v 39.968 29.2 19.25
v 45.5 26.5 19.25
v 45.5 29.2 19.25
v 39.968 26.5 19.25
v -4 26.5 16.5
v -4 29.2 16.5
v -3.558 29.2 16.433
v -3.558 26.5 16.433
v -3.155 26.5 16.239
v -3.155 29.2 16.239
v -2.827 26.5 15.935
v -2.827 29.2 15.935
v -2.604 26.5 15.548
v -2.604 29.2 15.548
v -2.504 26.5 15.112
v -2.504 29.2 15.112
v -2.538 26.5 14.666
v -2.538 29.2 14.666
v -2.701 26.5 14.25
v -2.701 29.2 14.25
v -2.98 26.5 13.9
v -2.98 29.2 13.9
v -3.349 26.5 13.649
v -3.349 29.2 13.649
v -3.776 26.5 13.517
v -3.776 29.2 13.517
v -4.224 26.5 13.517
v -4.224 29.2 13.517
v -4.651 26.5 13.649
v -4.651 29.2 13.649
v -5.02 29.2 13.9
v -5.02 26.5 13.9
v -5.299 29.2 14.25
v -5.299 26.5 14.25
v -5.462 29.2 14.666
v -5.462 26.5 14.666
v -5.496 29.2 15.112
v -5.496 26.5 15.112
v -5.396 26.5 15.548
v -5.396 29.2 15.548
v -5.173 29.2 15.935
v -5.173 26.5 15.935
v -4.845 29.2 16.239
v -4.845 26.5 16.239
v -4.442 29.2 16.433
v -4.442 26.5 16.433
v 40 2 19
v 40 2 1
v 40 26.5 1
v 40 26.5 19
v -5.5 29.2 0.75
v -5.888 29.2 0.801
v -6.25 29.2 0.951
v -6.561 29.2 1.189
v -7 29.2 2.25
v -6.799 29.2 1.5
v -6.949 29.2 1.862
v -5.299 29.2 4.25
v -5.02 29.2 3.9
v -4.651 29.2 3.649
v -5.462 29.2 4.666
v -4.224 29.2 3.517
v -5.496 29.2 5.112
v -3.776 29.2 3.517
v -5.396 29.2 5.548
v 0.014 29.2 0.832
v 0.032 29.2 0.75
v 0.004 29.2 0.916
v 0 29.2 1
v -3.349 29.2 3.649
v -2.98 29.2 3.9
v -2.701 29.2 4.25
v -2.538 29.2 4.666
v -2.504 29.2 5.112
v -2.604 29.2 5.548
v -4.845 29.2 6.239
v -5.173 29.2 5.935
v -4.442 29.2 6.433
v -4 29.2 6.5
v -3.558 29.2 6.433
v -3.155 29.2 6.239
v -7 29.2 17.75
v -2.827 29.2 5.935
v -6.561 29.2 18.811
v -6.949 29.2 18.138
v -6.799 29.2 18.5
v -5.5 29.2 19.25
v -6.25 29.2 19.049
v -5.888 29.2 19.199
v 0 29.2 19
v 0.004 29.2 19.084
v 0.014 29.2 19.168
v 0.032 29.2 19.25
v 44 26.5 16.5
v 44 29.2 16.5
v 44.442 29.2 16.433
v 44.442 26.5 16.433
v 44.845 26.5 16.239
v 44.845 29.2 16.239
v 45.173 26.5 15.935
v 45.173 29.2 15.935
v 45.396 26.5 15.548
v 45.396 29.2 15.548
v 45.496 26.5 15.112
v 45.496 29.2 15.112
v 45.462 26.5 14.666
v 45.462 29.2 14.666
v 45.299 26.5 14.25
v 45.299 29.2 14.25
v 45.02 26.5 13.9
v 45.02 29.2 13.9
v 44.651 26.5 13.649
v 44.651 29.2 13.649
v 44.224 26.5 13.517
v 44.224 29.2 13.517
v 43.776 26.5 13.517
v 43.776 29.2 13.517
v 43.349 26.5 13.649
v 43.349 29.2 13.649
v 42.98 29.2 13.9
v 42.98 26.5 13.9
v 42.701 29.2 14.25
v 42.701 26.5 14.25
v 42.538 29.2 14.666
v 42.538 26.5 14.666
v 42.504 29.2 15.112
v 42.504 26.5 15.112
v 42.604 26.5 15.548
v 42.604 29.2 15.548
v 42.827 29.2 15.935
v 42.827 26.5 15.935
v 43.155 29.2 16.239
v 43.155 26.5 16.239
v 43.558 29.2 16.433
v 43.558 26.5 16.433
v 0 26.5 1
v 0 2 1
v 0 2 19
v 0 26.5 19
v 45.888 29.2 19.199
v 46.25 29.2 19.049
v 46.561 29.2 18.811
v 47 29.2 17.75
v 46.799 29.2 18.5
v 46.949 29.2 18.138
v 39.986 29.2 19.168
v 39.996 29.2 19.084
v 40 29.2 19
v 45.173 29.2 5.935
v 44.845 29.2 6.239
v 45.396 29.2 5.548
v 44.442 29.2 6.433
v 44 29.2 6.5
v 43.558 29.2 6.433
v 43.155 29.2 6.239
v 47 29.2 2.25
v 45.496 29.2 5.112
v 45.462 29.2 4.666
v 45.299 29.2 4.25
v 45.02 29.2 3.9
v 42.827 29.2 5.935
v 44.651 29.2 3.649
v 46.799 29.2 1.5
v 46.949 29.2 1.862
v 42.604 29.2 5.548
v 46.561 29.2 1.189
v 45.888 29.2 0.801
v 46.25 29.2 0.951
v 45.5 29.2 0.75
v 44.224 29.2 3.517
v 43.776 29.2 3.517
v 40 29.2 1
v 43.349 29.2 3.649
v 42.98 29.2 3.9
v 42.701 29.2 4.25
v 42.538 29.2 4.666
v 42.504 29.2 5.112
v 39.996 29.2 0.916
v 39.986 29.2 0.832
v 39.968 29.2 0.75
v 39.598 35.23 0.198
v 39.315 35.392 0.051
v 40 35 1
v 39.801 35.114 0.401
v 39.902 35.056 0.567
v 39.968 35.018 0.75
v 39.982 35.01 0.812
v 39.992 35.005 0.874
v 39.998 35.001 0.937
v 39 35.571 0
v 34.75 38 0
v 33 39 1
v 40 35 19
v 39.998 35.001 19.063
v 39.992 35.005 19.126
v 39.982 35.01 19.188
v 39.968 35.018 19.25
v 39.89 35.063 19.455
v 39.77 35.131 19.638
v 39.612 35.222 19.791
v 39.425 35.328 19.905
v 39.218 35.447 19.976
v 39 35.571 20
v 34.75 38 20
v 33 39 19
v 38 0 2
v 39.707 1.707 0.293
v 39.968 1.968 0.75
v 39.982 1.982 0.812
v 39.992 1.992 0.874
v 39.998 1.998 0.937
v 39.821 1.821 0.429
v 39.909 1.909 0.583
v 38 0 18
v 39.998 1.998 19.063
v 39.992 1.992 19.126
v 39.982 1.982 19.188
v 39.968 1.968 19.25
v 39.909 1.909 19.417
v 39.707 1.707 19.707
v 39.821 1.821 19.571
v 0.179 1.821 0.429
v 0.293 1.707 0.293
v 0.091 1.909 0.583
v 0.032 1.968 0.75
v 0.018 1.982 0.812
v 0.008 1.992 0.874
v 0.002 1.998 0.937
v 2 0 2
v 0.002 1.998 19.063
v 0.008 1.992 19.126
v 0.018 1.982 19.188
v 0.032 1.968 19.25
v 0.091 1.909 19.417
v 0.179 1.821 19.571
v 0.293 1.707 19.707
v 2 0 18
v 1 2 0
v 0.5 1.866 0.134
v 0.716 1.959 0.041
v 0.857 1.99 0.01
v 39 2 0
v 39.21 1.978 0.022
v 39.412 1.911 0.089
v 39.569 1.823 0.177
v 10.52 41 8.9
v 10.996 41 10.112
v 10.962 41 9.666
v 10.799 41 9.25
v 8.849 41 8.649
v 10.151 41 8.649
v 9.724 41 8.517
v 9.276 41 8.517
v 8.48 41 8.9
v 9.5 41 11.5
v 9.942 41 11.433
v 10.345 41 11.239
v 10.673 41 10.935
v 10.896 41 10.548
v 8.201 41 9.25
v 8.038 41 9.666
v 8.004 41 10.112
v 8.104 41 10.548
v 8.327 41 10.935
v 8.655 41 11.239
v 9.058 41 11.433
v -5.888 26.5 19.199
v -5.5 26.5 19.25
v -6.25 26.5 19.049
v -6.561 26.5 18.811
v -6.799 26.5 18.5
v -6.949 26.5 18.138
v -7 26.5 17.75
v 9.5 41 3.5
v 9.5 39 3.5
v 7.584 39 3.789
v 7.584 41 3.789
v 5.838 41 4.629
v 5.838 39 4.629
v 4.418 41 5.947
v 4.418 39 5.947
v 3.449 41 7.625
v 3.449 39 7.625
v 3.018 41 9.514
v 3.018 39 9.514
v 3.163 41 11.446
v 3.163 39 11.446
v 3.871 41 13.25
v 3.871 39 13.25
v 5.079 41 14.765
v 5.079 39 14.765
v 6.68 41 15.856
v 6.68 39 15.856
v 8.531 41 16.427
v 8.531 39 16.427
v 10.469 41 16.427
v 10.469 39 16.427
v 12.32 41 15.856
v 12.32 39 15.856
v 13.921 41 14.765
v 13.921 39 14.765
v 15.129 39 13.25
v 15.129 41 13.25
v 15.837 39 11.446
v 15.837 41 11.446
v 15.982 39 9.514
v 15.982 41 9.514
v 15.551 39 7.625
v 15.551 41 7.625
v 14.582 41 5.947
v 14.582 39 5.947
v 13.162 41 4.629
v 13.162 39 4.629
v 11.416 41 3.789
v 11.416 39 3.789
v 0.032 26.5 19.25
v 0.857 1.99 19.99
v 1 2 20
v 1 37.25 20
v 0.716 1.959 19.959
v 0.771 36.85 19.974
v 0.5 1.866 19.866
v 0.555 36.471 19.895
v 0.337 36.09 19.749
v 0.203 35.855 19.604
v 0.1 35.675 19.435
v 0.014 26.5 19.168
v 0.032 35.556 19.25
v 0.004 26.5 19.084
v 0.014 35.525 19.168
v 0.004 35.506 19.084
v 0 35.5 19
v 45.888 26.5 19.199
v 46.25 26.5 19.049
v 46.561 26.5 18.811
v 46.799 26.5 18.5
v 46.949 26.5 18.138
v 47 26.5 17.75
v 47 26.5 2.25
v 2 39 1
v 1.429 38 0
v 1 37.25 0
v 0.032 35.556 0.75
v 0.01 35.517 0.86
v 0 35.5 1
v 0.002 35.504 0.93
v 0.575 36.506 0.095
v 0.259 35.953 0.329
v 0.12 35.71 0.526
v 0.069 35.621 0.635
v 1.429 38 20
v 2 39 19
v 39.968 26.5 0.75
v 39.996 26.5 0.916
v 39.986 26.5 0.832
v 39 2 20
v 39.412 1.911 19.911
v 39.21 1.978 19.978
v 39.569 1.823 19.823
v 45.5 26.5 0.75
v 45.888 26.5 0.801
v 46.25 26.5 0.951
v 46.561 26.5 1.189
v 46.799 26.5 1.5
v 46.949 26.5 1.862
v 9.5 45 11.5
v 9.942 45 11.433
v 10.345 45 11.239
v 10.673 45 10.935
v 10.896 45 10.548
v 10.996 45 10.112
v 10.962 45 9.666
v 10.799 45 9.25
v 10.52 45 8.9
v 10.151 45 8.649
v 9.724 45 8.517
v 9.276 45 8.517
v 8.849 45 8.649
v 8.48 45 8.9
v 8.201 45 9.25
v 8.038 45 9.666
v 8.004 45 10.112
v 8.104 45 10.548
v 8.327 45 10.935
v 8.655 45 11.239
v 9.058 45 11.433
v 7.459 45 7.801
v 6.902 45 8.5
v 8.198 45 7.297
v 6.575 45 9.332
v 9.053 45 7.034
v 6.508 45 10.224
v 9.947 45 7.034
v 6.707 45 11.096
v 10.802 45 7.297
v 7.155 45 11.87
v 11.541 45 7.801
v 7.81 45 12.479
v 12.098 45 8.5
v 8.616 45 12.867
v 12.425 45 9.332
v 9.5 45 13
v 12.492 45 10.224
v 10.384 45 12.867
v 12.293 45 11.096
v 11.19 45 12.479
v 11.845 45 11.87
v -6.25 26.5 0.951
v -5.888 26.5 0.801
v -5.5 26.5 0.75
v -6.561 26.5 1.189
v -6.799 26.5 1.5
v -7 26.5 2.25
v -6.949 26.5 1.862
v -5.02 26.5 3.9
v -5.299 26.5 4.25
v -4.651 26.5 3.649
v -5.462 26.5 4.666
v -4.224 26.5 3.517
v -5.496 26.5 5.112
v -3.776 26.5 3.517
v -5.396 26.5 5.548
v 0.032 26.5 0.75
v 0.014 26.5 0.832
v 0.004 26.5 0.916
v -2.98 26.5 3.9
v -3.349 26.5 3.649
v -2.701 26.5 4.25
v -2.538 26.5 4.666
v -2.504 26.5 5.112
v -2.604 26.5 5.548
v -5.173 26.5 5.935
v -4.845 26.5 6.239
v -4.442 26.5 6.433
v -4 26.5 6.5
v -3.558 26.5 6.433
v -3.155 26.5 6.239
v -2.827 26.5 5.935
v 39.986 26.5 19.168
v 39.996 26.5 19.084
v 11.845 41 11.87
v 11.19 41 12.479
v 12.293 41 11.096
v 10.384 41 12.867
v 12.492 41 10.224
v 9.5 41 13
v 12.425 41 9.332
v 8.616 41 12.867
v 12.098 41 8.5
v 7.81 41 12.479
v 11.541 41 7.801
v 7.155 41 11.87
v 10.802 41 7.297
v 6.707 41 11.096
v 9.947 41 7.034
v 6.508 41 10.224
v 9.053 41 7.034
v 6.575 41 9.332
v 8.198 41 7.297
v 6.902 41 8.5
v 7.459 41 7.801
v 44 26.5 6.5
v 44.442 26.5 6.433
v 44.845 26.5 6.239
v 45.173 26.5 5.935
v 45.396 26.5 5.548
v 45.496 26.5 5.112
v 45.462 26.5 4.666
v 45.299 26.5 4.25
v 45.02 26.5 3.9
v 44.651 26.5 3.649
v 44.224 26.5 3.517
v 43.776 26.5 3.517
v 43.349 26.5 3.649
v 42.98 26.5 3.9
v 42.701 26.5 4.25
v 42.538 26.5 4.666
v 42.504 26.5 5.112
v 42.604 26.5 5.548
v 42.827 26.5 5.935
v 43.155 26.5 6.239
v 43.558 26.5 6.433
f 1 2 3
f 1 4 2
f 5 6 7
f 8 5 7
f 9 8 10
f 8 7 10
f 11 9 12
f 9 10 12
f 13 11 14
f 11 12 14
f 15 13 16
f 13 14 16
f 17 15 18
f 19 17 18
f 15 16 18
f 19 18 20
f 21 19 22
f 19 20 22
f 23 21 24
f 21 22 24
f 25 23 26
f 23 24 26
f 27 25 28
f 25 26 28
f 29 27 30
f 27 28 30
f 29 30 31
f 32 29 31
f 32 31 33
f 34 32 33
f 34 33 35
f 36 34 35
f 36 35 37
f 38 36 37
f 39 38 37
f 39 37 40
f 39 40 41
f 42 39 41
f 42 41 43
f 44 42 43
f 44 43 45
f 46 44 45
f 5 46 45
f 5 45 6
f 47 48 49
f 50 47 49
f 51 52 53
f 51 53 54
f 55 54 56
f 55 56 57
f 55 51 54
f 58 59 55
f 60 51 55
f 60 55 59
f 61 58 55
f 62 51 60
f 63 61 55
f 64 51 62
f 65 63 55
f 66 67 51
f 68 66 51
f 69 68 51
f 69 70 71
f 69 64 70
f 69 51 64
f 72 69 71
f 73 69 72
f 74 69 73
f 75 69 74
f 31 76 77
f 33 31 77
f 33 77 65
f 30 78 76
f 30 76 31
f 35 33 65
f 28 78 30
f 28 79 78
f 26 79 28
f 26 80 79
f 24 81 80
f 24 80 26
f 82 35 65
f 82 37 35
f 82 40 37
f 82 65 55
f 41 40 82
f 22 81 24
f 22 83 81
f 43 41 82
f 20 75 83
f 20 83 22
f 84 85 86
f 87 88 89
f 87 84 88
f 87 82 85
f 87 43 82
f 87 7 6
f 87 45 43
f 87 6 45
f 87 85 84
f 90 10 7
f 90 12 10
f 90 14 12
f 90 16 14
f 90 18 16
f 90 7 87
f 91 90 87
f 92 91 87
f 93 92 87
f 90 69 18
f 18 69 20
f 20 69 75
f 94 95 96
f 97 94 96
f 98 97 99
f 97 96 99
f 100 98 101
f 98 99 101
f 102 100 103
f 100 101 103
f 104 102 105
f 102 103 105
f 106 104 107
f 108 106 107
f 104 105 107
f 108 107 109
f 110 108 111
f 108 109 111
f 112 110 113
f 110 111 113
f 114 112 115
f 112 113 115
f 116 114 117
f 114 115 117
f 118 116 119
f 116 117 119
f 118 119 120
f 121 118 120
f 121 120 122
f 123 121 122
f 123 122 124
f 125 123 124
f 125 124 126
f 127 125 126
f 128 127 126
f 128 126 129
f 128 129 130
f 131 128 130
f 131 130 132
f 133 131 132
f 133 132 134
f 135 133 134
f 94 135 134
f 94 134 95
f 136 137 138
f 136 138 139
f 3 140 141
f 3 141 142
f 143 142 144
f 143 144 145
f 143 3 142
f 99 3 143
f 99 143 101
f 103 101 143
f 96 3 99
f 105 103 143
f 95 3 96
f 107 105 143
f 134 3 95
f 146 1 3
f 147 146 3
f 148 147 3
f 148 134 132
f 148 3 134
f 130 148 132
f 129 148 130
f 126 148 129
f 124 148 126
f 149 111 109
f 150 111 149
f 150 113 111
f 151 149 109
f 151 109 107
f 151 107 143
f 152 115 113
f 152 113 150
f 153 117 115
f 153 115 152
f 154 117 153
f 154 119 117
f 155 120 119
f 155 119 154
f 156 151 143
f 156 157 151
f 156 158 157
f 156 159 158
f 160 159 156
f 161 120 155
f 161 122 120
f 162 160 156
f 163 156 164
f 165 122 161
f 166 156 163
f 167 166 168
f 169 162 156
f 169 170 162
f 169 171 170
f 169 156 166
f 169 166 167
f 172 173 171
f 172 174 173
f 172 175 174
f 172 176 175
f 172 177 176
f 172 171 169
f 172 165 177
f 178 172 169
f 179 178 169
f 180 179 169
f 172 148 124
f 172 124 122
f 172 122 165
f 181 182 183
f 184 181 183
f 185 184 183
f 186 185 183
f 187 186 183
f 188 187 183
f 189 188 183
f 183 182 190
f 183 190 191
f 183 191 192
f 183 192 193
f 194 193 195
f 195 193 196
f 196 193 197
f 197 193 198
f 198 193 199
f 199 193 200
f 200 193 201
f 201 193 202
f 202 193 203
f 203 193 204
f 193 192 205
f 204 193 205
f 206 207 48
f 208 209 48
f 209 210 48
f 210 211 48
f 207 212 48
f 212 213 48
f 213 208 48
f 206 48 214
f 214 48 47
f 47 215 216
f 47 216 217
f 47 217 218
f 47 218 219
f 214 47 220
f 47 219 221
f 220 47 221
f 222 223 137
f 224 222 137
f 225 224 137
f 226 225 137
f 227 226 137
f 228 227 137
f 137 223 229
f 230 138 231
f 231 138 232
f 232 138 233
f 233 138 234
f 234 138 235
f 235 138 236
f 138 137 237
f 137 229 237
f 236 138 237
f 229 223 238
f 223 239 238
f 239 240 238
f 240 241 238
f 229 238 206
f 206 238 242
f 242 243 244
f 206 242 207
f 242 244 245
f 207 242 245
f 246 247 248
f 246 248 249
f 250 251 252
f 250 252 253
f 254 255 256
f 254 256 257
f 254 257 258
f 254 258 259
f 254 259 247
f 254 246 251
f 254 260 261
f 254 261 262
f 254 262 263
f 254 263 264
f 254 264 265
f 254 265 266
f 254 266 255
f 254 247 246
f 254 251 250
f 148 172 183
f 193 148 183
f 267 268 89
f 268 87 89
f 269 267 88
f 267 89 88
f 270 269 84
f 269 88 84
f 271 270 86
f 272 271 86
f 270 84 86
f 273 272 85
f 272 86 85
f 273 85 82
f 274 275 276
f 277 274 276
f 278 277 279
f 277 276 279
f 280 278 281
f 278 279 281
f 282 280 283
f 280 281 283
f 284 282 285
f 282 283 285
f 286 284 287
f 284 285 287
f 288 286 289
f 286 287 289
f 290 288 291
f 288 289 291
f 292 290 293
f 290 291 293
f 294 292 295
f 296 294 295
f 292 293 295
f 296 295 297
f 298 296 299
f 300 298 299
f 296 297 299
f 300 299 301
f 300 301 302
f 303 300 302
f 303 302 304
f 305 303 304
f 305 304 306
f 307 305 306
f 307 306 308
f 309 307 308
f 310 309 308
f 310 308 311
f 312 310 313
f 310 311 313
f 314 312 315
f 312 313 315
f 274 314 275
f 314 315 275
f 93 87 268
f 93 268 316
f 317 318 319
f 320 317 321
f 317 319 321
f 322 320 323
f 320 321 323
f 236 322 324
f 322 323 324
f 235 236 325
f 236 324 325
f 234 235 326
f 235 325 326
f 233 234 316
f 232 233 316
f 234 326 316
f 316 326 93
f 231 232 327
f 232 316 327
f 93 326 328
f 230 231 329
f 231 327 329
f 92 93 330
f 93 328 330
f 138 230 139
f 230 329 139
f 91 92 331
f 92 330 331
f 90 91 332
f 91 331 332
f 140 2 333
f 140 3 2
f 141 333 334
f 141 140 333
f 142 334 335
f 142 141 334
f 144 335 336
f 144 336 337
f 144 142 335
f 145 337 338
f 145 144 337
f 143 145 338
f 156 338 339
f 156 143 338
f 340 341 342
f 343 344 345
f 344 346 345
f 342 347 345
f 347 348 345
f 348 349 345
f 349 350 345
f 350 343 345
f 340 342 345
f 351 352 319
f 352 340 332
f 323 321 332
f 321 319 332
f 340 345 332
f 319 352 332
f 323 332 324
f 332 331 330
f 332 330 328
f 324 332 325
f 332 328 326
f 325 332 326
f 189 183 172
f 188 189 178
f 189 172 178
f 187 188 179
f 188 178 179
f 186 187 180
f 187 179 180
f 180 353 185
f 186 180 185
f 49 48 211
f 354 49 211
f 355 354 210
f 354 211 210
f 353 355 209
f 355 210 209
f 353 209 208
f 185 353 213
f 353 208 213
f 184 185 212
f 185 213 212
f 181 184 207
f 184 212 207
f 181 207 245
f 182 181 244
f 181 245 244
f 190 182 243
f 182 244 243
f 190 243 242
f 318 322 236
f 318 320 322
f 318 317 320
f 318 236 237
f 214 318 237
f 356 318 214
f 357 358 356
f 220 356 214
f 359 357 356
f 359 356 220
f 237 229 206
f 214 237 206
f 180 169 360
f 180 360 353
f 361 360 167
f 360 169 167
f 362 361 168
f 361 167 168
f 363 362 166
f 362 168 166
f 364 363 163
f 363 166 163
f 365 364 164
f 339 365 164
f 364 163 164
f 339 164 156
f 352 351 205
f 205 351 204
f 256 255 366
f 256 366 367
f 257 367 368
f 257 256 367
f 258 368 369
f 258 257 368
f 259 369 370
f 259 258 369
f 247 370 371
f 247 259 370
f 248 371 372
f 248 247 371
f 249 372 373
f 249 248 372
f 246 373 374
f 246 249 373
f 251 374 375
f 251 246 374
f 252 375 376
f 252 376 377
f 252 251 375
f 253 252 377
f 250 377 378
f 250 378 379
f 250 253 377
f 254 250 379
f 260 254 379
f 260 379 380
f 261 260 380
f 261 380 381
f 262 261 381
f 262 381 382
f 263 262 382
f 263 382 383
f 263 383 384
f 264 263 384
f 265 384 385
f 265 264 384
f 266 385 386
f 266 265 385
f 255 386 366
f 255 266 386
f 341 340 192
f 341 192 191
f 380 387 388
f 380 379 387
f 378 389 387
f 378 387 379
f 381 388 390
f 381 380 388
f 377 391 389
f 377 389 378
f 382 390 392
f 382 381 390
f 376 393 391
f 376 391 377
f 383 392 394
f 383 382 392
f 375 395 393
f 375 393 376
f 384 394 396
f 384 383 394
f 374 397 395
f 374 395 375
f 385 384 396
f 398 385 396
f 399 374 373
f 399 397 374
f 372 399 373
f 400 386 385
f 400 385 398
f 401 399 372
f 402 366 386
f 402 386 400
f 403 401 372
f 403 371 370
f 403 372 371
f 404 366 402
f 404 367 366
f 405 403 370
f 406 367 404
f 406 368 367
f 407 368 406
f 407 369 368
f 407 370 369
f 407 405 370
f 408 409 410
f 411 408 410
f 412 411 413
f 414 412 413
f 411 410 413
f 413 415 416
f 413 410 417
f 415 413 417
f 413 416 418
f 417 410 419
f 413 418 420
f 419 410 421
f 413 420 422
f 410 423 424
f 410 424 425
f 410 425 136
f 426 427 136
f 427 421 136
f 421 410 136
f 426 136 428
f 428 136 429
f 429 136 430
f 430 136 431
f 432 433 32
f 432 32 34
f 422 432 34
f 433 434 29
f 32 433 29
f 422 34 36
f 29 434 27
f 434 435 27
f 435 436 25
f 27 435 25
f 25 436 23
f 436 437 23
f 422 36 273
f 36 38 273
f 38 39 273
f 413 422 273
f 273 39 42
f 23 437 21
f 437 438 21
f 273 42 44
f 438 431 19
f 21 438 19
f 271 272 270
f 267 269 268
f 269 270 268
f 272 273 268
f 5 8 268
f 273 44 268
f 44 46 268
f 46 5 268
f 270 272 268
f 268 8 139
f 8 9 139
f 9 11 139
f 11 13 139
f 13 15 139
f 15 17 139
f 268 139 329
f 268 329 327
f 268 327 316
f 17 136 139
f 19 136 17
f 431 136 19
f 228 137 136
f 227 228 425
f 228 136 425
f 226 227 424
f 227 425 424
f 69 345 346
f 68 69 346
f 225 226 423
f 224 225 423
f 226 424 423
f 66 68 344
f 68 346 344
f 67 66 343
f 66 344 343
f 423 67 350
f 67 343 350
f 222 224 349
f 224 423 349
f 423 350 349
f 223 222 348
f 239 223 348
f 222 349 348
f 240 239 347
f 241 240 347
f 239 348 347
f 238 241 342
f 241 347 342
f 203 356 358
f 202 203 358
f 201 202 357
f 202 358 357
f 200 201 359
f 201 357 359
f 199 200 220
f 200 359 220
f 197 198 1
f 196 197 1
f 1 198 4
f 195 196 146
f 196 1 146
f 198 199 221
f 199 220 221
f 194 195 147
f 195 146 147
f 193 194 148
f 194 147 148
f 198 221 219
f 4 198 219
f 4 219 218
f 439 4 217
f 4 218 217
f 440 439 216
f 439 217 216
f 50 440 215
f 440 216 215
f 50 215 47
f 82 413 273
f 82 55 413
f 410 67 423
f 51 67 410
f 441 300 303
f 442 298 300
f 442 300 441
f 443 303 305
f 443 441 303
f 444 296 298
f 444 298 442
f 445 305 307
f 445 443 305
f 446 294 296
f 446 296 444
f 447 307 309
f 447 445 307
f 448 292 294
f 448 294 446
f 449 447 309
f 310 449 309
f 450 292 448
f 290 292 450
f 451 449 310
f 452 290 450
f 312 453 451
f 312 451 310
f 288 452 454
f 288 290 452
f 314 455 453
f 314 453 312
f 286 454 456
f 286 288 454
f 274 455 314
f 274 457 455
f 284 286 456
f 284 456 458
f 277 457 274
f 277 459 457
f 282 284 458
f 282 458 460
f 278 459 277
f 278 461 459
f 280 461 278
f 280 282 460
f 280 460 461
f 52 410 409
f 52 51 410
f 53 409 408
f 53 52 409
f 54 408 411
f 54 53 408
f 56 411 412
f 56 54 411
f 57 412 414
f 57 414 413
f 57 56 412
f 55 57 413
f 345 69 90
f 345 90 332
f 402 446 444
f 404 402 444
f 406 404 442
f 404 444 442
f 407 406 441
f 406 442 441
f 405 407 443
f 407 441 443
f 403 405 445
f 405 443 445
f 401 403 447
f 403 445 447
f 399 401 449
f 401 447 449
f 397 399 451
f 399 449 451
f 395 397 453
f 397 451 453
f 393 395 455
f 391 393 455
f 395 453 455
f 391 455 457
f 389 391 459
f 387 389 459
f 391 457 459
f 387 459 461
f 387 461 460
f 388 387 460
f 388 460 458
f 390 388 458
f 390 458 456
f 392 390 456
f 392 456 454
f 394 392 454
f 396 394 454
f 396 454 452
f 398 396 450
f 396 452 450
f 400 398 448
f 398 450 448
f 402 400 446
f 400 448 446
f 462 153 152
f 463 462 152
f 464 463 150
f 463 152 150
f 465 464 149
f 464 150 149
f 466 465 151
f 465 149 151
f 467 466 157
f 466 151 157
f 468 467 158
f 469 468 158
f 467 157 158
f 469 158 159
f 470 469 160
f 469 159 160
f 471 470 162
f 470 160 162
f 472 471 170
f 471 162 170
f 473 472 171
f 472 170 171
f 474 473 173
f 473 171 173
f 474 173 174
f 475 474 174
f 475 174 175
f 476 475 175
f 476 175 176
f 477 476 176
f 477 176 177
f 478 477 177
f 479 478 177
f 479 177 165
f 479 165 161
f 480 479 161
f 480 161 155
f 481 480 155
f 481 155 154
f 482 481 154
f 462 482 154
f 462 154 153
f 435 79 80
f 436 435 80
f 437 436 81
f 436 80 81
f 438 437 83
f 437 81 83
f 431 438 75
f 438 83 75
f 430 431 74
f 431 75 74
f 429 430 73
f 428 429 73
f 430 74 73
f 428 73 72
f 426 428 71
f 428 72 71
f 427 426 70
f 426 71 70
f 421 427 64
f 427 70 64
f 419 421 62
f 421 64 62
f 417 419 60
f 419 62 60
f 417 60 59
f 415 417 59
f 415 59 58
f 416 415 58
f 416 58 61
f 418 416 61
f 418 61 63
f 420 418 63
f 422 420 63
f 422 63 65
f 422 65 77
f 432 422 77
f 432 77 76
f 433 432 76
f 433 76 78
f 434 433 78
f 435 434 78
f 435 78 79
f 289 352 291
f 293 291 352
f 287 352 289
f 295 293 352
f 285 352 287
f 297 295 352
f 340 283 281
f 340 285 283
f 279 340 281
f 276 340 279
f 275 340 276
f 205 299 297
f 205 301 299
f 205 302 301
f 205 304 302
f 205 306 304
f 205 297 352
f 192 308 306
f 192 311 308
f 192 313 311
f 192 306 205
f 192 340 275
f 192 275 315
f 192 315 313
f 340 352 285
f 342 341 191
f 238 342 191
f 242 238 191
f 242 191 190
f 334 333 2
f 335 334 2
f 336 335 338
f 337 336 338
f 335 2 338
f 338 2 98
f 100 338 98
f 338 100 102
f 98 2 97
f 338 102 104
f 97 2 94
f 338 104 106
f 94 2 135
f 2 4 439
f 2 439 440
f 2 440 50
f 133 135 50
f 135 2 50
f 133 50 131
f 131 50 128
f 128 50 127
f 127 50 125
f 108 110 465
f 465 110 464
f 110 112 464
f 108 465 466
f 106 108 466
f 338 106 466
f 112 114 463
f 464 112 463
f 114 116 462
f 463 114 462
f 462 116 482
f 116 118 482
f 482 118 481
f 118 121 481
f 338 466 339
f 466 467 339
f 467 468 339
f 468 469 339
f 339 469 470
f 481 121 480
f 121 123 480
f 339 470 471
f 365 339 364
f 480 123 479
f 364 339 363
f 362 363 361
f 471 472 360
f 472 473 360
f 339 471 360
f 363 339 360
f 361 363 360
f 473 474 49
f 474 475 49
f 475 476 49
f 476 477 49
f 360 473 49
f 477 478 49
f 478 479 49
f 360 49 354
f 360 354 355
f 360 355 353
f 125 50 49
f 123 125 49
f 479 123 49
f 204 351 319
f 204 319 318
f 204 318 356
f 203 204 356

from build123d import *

# Parameters (mm, degrees)
SKETCH_1_W          = 40
SKETCH_1_H          = 39
EXTRUDE_1_DEPTH     = 20
SKETCH_2_W          = 18.5
SKETCH_2_H          = 2.7
EXTRUDE_2_DEPTH     = 7
SKETCH_3_W          = 18.5
SKETCH_3_H          = 2.7
EXTRUDE_3_DEPTH     = 7
SKETCH_4_R          = 1.5
CUT_EXTRUDE_1_DEPTH = 7
CHAMFER_1_SIZE      = 2
CHAMFER_2_SIZE      = 2
CHAMFER_2_SIZE2     = 3.5
CHAMFER_3_SIZE      = 4
CHAMFER_3_SIZE2     = 7
CHAMFER_4_SIZE      = 1
SKETCH_5_R          = 6.5
EXTRUDE_4_DEPTH     = 2
SKETCH_6_R          = 3
SKETCH_6_R_2        = 1.5
EXTRUDE_5_DEPTH     = 4
FILLET_1_R          = 1.5
FILLET_2_R          = 1


with BuildPart() as part:
    # 草图1 → 凸台-拉伸1 (new body)
    with BuildSketch(Plane.XY):
        with Locations((20, 19.5)):
            Rectangle(SKETCH_1_W, SKETCH_1_H)
    extrude(amount=EXTRUDE_1_DEPTH)

    # 草图2 → 凸台-拉伸2 (add)
    with BuildSketch(Plane.ZY):
        with Locations((10, 27.85)):
            Rectangle(SKETCH_2_W, SKETCH_2_H)
    extrude(amount=EXTRUDE_2_DEPTH)

    # 草图3 → 凸台-拉伸3 (add)
    with BuildSketch(Plane(origin=(40, 0, 0), x_dir=(0, 0, -1), z_dir=(1, 0, 0))):
        with Locations((-10, 27.85)):
            Rectangle(SKETCH_3_W, SKETCH_3_H)
    extrude(amount=EXTRUDE_3_DEPTH)

    # 草图4 → 切除-拉伸1 (cut)
    with BuildSketch(Plane(origin=(0, 29.2, 0), x_dir=(1, 0, 0), z_dir=(0, 1, 0))):
        with Locations(Location((-4, -5, 0), (0, 0, 270))):
            Circle(SKETCH_4_R)
        with Locations(Location((44, -5, 0), (0, 0, 270))):
            Circle(SKETCH_4_R)
        with Locations(Location((-4, -15, 0), (0, 0, 270))):
            Circle(SKETCH_4_R)
        with Locations(Location((44, -15, 0), (0, 0, 270))):
            Circle(SKETCH_4_R)
    extrude(amount=-CUT_EXTRUDE_1_DEPTH, mode=Mode.SUBTRACT)

    # 倒角1
    chamfer_1_edges = [part.edges().sort_by_distance(p)[0] for p in [
        (20, 0, 0),
        (40, 0, 10),
        (0, 0, 10),
        (20, 0, 20),
    ]]
    chamfer(chamfer_1_edges, length=CHAMFER_1_SIZE)

    # 倒角2
    chamfer_2_edges = [part.edges().sort_by_distance(p)[0] for p in [
        (0, 39, 10),
    ]]
    chamfer_2_side = [part.faces().sort_by_distance(p)[0] for p in [
        (20, 39, 10),
    ]]
    chamfer(chamfer_2_edges, length=CHAMFER_2_SIZE, length2=CHAMFER_2_SIZE2, reference=chamfer_2_side[0])

    # 倒角3
    chamfer_3_edges = [part.edges().sort_by_distance(p)[0] for p in [
        (40, 39, 10),
    ]]
    chamfer_3_side = [part.faces().sort_by_distance(p)[0] for p in [
        (40, 19.967962466, 10),
    ]]
    chamfer(chamfer_3_edges, length=CHAMFER_3_SIZE, length2=CHAMFER_3_SIZE2, reference=chamfer_3_side[0])

    # 倒角4
    chamfer_4_edges = [part.edges().sort_by_distance(p)[0] for p in [
        (17.5, 39, 0),
        (17.5, 39, 20),
    ]]
    chamfer(chamfer_4_edges, length=CHAMFER_4_SIZE)

    # 草图5 → 凸台-拉伸4 (add)
    with BuildSketch(Plane(origin=(0, 39, 0), x_dir=(1, 0, 0), z_dir=(0, 1, 0))):
        with Locations(Location((9.5, -10, 0), (0, 0, 90))):
            Circle(SKETCH_5_R)
    extrude(amount=EXTRUDE_4_DEPTH)

    # 草图6 → 凸台-拉伸5 (add)
    with BuildSketch(Plane(origin=(0, 41, 0), x_dir=(1, 0, 0), z_dir=(0, 1, 0))):
        with Locations(Location((9.5, -10, 0), (0, 0, 270))):
            Circle(SKETCH_6_R)
        with Locations(Location((9.5, -10, 0), (0, 0, 270))):
            Circle(SKETCH_6_R_2, mode=Mode.SUBTRACT)
    extrude(amount=EXTRUDE_5_DEPTH)

    # 圆角1
    fillet_1_edges = [part.edges().sort_by_distance(p)[0] for p in [
        (-7, 27.85, 0.75),
        (-7, 27.85, 19.25),
        (47, 27.85, 19.25),
        (47, 27.85, 0.75),
    ]]
    fillet(fillet_1_edges, radius=FILLET_1_R)

    # 圆角2
    # the kernel refuses this fillet: 1 mm, written as the material it takes off along each edge
    with BuildSketch(Plane(origin=(0, 38, 20), x_dir=(1, 0, 0), z_dir=(0, -1, 0))) as fillet_2_piece_1_section:
        with BuildLine():
            CenterArc((FILLET_2_R, -FILLET_2_R), FILLET_2_R, 90, 90)
            Line((0, -FILLET_2_R), (0, 0))
            Line((0, 0), (FILLET_2_R, 0))
        make_face()
    fillet_2_piece_1 = extrude(amount=38.5, mode=Mode.PRIVATE)
    fillet_2_piece_1 = split(fillet_2_piece_1, bisect_by=Plane(origin=(0.233478453, 29.2, 19.792941909), z_dir=(0, 1, 0)), keep=Keep.TOP, mode=Mode.PRIVATE)
    fillet_2_piece_1 = split(fillet_2_piece_1, bisect_by=Plane(origin=(0.233478453, 33.6, 19.25), z_dir=(0, 0, 1)), keep=Keep.TOP, mode=Mode.PRIVATE)
    add(fillet_2_piece_1, mode=Mode.SUBTRACT)
    with BuildSketch(Plane(origin=(0, 38, 20), x_dir=(1, 0, 0), z_dir=(0, -1, 0))) as fillet_2_piece_2_section:
        with BuildLine():
            CenterArc((FILLET_2_R, -FILLET_2_R), FILLET_2_R, 90, 90)
            Line((0, -FILLET_2_R), (0, 0))
            Line((0, 0), (FILLET_2_R, 0))
        make_face()
    fillet_2_piece_2 = extrude(amount=38.5, mode=Mode.PRIVATE)
    fillet_2_piece_2 = split(fillet_2_piece_2, bisect_by=Plane(origin=(-0.003280029, 29.2, 19.146607635), z_dir=(0, 1, 0)), keep=Keep.TOP, mode=Mode.PRIVATE)
    fillet_2_piece_2 = split(fillet_2_piece_2, bisect_by=Plane(origin=(-0.003280029, 33.6, 19.25), z_dir=(0, 0, -1)), keep=Keep.TOP, mode=Mode.PRIVATE)
    add(fillet_2_piece_2, mode=Mode.SUBTRACT)
    with BuildSketch(Plane(origin=(0, 38, 20), x_dir=(1, 0, 0), z_dir=(0, -1, 0))) as fillet_2_piece_3_section:
        with BuildLine():
            CenterArc((FILLET_2_R, -FILLET_2_R), FILLET_2_R, 90, 90)
            Line((0, -FILLET_2_R), (0, 0))
            Line((0, 0), (FILLET_2_R, 0))
        make_face()
    fillet_2_piece_3 = extrude(amount=38.5, mode=Mode.PRIVATE)
    fillet_2_piece_3 = split(fillet_2_piece_3, bisect_by=Plane(origin=(0.233478453, 29.2, 19.792941909), z_dir=(0, -1, 0)), keep=Keep.TOP, mode=Mode.PRIVATE)
    fillet_2_piece_3 = split(fillet_2_piece_3, bisect_by=Plane(origin=(0.233478453, 27.85, 19.25), z_dir=(0, 0, 1)), keep=Keep.TOP, mode=Mode.PRIVATE)
    fillet_2_piece_3 = split(fillet_2_piece_3, bisect_by=Plane(origin=(0.233478453, 26.5, 19.792941909), z_dir=(0, 1, 0)), keep=Keep.TOP, mode=Mode.PRIVATE)
    add(fillet_2_piece_3, mode=Mode.SUBTRACT)
    with BuildSketch(Plane(origin=(0, 38, 20), x_dir=(1, 0, 0), z_dir=(0, -1, 0))) as fillet_2_piece_4_section:
        with BuildLine():
            CenterArc((FILLET_2_R, -FILLET_2_R), FILLET_2_R, 90, 90)
            Line((0, -FILLET_2_R), (0, 0))
            Line((0, 0), (FILLET_2_R, 0))
        make_face()
    fillet_2_piece_4 = extrude(amount=38.5, mode=Mode.PRIVATE)
    fillet_2_piece_4 = split(fillet_2_piece_4, bisect_by=Plane(origin=(0.233478453, 13, 19.25), z_dir=(0, 0, 1)), keep=Keep.TOP, mode=Mode.PRIVATE)
    fillet_2_piece_4 = split(fillet_2_piece_4, bisect_by=Plane(origin=(0.233478453, 26.5, 19.792941909), z_dir=(0, -1, 0)), keep=Keep.TOP, mode=Mode.PRIVATE)
    add(fillet_2_piece_4, mode=Mode.SUBTRACT)
    with BuildSketch(Plane(origin=(0, 38, 20), x_dir=(1, 0, 0), z_dir=(0, -1, 0))) as fillet_2_piece_5_section:
        with BuildLine():
            CenterArc((FILLET_2_R, -FILLET_2_R), FILLET_2_R, 90, 90)
            Line((0, -FILLET_2_R), (0, 0))
            Line((0, 0), (FILLET_2_R, 0))
        make_face()
    fillet_2_piece_5 = extrude(amount=38.5, mode=Mode.PRIVATE)
    fillet_2_piece_5 = split(fillet_2_piece_5, bisect_by=Plane(origin=(-0.003280029, 13, 19.25), z_dir=(0, 0, -1)), keep=Keep.TOP, mode=Mode.PRIVATE)
    fillet_2_piece_5 = split(fillet_2_piece_5, bisect_by=Plane(origin=(-0.003280029, 26.5, 19.146607635), z_dir=(0, -1, 0)), keep=Keep.TOP, mode=Mode.PRIVATE)
    add(fillet_2_piece_5, mode=Mode.SUBTRACT)
    with BuildSketch(Plane(origin=(0, 38, 0), x_dir=(1, 0, 0), z_dir=(0, -1, 0))) as fillet_2_piece_6_section:
        with BuildLine():
            CenterArc((FILLET_2_R, FILLET_2_R), FILLET_2_R, 180, 90)
            Line((0, FILLET_2_R), (0, 0))
            Line((0, 0), (FILLET_2_R, 0))
        make_face()
    fillet_2_piece_6 = extrude(amount=38.5, mode=Mode.PRIVATE)
    fillet_2_piece_6 = split(fillet_2_piece_6, bisect_by=Plane(origin=(0.233478453, 29.2, 0.207058091), z_dir=(0, 1, 0)), keep=Keep.TOP, mode=Mode.PRIVATE)
    fillet_2_piece_6 = split(fillet_2_piece_6, bisect_by=Plane(origin=(0.233478453, 33.6, 0.75), z_dir=(0, 0, -1)), keep=Keep.TOP, mode=Mode.PRIVATE)
    add(fillet_2_piece_6, mode=Mode.SUBTRACT)
    with BuildSketch(Plane(origin=(0, 38, 0), x_dir=(1, 0, 0), z_dir=(0, -1, 0))) as fillet_2_piece_7_section:
        with BuildLine():
            CenterArc((FILLET_2_R, FILLET_2_R), FILLET_2_R, 180, 90)
            Line((0, FILLET_2_R), (0, 0))
            Line((0, 0), (FILLET_2_R, 0))
        make_face()
    fillet_2_piece_7 = extrude(amount=38.5, mode=Mode.PRIVATE)
    fillet_2_piece_7 = split(fillet_2_piece_7, bisect_by=Plane(origin=(-0.003280029, 29.2, 0.853392365), z_dir=(0, 1, 0)), keep=Keep.TOP, mode=Mode.PRIVATE)
    fillet_2_piece_7 = split(fillet_2_piece_7, bisect_by=Plane(origin=(-0.003280029, 33.6, 0.75), z_dir=(0, 0, 1)), keep=Keep.TOP, mode=Mode.PRIVATE)
    add(fillet_2_piece_7, mode=Mode.SUBTRACT)
    with BuildSketch(Plane(origin=(0, 38, 0), x_dir=(1, 0, 0), z_dir=(0, -1, 0))) as fillet_2_piece_8_section:
        with BuildLine():
            CenterArc((FILLET_2_R, FILLET_2_R), FILLET_2_R, 180, 90)
            Line((0, FILLET_2_R), (0, 0))
            Line((0, 0), (FILLET_2_R, 0))
        make_face()
    fillet_2_piece_8 = extrude(amount=38.5, mode=Mode.PRIVATE)
    fillet_2_piece_8 = split(fillet_2_piece_8, bisect_by=Plane(origin=(0.233478453, 29.2, 0.207058091), z_dir=(0, -1, 0)), keep=Keep.TOP, mode=Mode.PRIVATE)
    fillet_2_piece_8 = split(fillet_2_piece_8, bisect_by=Plane(origin=(0.233478453, 26.5, 0.207058091), z_dir=(0, 1, 0)), keep=Keep.TOP, mode=Mode.PRIVATE)
    fillet_2_piece_8 = split(fillet_2_piece_8, bisect_by=Plane(origin=(0.233478453, 27.85, 0.75), z_dir=(0, 0, -1)), keep=Keep.TOP, mode=Mode.PRIVATE)
    add(fillet_2_piece_8, mode=Mode.SUBTRACT)
    with BuildSketch(Plane(origin=(0, 38, 0), x_dir=(1, 0, 0), z_dir=(0, -1, 0))) as fillet_2_piece_9_section:
        with BuildLine():
            CenterArc((FILLET_2_R, FILLET_2_R), FILLET_2_R, 180, 90)
            Line((0, FILLET_2_R), (0, 0))
            Line((0, 0), (FILLET_2_R, 0))
        make_face()
    fillet_2_piece_9 = extrude(amount=38.5, mode=Mode.PRIVATE)
    fillet_2_piece_9 = split(fillet_2_piece_9, bisect_by=Plane(origin=(0.233478453, 26.5, 0.207058091), z_dir=(0, -1, 0)), keep=Keep.TOP, mode=Mode.PRIVATE)
    fillet_2_piece_9 = split(fillet_2_piece_9, bisect_by=Plane(origin=(0.233478453, 13, 0.75), z_dir=(0, 0, -1)), keep=Keep.TOP, mode=Mode.PRIVATE)
    add(fillet_2_piece_9, mode=Mode.SUBTRACT)
    with BuildSketch(Plane(origin=(0, 38, 0), x_dir=(1, 0, 0), z_dir=(0, -1, 0))) as fillet_2_piece_10_section:
        with BuildLine():
            CenterArc((FILLET_2_R, FILLET_2_R), FILLET_2_R, 180, 90)
            Line((0, FILLET_2_R), (0, 0))
            Line((0, 0), (FILLET_2_R, 0))
        make_face()
    fillet_2_piece_10 = extrude(amount=38.5, mode=Mode.PRIVATE)
    fillet_2_piece_10 = split(fillet_2_piece_10, bisect_by=Plane(origin=(-0.003280029, 26.5, 0.853392365), z_dir=(0, -1, 0)), keep=Keep.TOP, mode=Mode.PRIVATE)
    fillet_2_piece_10 = split(fillet_2_piece_10, bisect_by=Plane(origin=(-0.003280029, 13, 0.75), z_dir=(0, 0, 1)), keep=Keep.TOP, mode=Mode.PRIVATE)
    add(fillet_2_piece_10, mode=Mode.SUBTRACT)
    with BuildSketch(Plane(origin=(40, -0.5, 0), x_dir=(0, 0, 1), z_dir=(0, 1, 0))) as fillet_2_piece_11_section:
        with BuildLine():
            CenterArc((FILLET_2_R, -FILLET_2_R), FILLET_2_R, 90, 90)
            Line((0, -FILLET_2_R), (0, 0))
            Line((0, 0), (FILLET_2_R, 0))
        make_face()
    fillet_2_piece_11 = extrude(amount=38, mode=Mode.PRIVATE)
    fillet_2_piece_11 = split(fillet_2_piece_11, bisect_by=Plane(origin=(40.003280029, 26.5, 0.853392365), z_dir=(0, -1, 0)), keep=Keep.TOP, mode=Mode.PRIVATE)
    fillet_2_piece_11 = split(fillet_2_piece_11, bisect_by=Plane(origin=(40.003280029, 13, 0.75), z_dir=(0, 0, 1)), keep=Keep.TOP, mode=Mode.PRIVATE)
    add(fillet_2_piece_11, mode=Mode.SUBTRACT)
    with BuildSketch(Plane(origin=(40, -0.5, 0), x_dir=(0, 0, 1), z_dir=(0, 1, 0))) as fillet_2_piece_12_section:
        with BuildLine():
            CenterArc((FILLET_2_R, -FILLET_2_R), FILLET_2_R, 90, 90)
            Line((0, -FILLET_2_R), (0, 0))
            Line((0, 0), (FILLET_2_R, 0))
        make_face()
    fillet_2_piece_12 = extrude(amount=38, mode=Mode.PRIVATE)
    fillet_2_piece_12 = split(fillet_2_piece_12, bisect_by=Plane(origin=(39.766521547, 26.5, 0.207058091), z_dir=(0, -1, 0)), keep=Keep.TOP, mode=Mode.PRIVATE)
    fillet_2_piece_12 = split(fillet_2_piece_12, bisect_by=Plane(origin=(39.766521547, 13, 0.75), z_dir=(0, 0, -1)), keep=Keep.TOP, mode=Mode.PRIVATE)
    add(fillet_2_piece_12, mode=Mode.SUBTRACT)
    with BuildSketch(Plane(origin=(40, -0.5, 0), x_dir=(0, 0, 1), z_dir=(0, 1, 0))) as fillet_2_piece_13_section:
        with BuildLine():
            CenterArc((FILLET_2_R, -FILLET_2_R), FILLET_2_R, 90, 90)
            Line((0, -FILLET_2_R), (0, 0))
            Line((0, 0), (FILLET_2_R, 0))
        make_face()
    fillet_2_piece_13 = extrude(amount=38, mode=Mode.PRIVATE)
    fillet_2_piece_13 = split(fillet_2_piece_13, bisect_by=Plane(origin=(39.766521547, 26.5, 0.207058091), z_dir=(0, 1, 0)), keep=Keep.TOP, mode=Mode.PRIVATE)
    fillet_2_piece_13 = split(fillet_2_piece_13, bisect_by=Plane(origin=(39.766521547, 29.2, 0.207058091), z_dir=(0, -1, 0)), keep=Keep.TOP, mode=Mode.PRIVATE)
    fillet_2_piece_13 = split(fillet_2_piece_13, bisect_by=Plane(origin=(39.766521547, 27.85, 0.75), z_dir=(0, 0, -1)), keep=Keep.TOP, mode=Mode.PRIVATE)
    add(fillet_2_piece_13, mode=Mode.SUBTRACT)
    with BuildSketch(Plane(origin=(40, -0.5, 0), x_dir=(0, 0, 1), z_dir=(0, 1, 0))) as fillet_2_piece_14_section:
        with BuildLine():
            CenterArc((FILLET_2_R, -FILLET_2_R), FILLET_2_R, 90, 90)
            Line((0, -FILLET_2_R), (0, 0))
            Line((0, 0), (FILLET_2_R, 0))
        make_face()
    fillet_2_piece_14 = extrude(amount=38, mode=Mode.PRIVATE)
    fillet_2_piece_14 = split(fillet_2_piece_14, bisect_by=Plane(origin=(40.003280029, 29.2, 0.853392365), z_dir=(0, 1, 0)), keep=Keep.TOP, mode=Mode.PRIVATE)
    fillet_2_piece_14 = split(fillet_2_piece_14, bisect_by=Plane(origin=(40.003280029, 33.35, 0.75), z_dir=(0, 0, 1)), keep=Keep.TOP, mode=Mode.PRIVATE)
    add(fillet_2_piece_14, mode=Mode.SUBTRACT)
    with BuildSketch(Plane(origin=(40, -0.5, 0), x_dir=(0, 0, 1), z_dir=(0, 1, 0))) as fillet_2_piece_15_section:
        with BuildLine():
            CenterArc((FILLET_2_R, -FILLET_2_R), FILLET_2_R, 90, 90)
            Line((0, -FILLET_2_R), (0, 0))
            Line((0, 0), (FILLET_2_R, 0))
        make_face()
    fillet_2_piece_15 = extrude(amount=38, mode=Mode.PRIVATE)
    fillet_2_piece_15 = split(fillet_2_piece_15, bisect_by=Plane(origin=(39.766521547, 29.2, 0.207058091), z_dir=(0, 1, 0)), keep=Keep.TOP, mode=Mode.PRIVATE)
    fillet_2_piece_15 = split(fillet_2_piece_15, bisect_by=Plane(origin=(39.766521547, 33.35, 0.75), z_dir=(0, 0, -1)), keep=Keep.TOP, mode=Mode.PRIVATE)
    add(fillet_2_piece_15, mode=Mode.SUBTRACT)
    with BuildSketch(Plane(origin=(40, -0.5, 20), x_dir=(0, 0, -1), z_dir=(0, 1, 0))) as fillet_2_piece_16_section:
        with BuildLine():
            CenterArc((FILLET_2_R, FILLET_2_R), FILLET_2_R, 180, 90)
            Line((0, FILLET_2_R), (0, 0))
            Line((0, 0), (FILLET_2_R, 0))
        make_face()
    fillet_2_piece_16 = extrude(amount=38, mode=Mode.PRIVATE)
    fillet_2_piece_16 = split(fillet_2_piece_16, bisect_by=Plane(origin=(40.003280029, 26.5, 19.146607635), z_dir=(0, -1, 0)), keep=Keep.TOP, mode=Mode.PRIVATE)
    fillet_2_piece_16 = split(fillet_2_piece_16, bisect_by=Plane(origin=(40.003280029, 13, 19.25), z_dir=(0, 0, -1)), keep=Keep.TOP, mode=Mode.PRIVATE)
    add(fillet_2_piece_16, mode=Mode.SUBTRACT)
    with BuildSketch(Plane(origin=(40, -0.5, 20), x_dir=(0, 0, -1), z_dir=(0, 1, 0))) as fillet_2_piece_17_section:
        with BuildLine():
            CenterArc((FILLET_2_R, FILLET_2_R), FILLET_2_R, 180, 90)
            Line((0, FILLET_2_R), (0, 0))
            Line((0, 0), (FILLET_2_R, 0))
        make_face()
    fillet_2_piece_17 = extrude(amount=38, mode=Mode.PRIVATE)
    fillet_2_piece_17 = split(fillet_2_piece_17, bisect_by=Plane(origin=(39.766521547, 26.5, 19.792941909), z_dir=(0, -1, 0)), keep=Keep.TOP, mode=Mode.PRIVATE)
    fillet_2_piece_17 = split(fillet_2_piece_17, bisect_by=Plane(origin=(39.766521547, 13, 19.25), z_dir=(0, 0, 1)), keep=Keep.TOP, mode=Mode.PRIVATE)
    add(fillet_2_piece_17, mode=Mode.SUBTRACT)
    with BuildSketch(Plane(origin=(40, -0.5, 20), x_dir=(0, 0, -1), z_dir=(0, 1, 0))) as fillet_2_piece_18_section:
        with BuildLine():
            CenterArc((FILLET_2_R, FILLET_2_R), FILLET_2_R, 180, 90)
            Line((0, FILLET_2_R), (0, 0))
            Line((0, 0), (FILLET_2_R, 0))
        make_face()
    fillet_2_piece_18 = extrude(amount=38, mode=Mode.PRIVATE)
    fillet_2_piece_18 = split(fillet_2_piece_18, bisect_by=Plane(origin=(39.766521547, 26.5, 19.792941909), z_dir=(0, 1, 0)), keep=Keep.TOP, mode=Mode.PRIVATE)
    fillet_2_piece_18 = split(fillet_2_piece_18, bisect_by=Plane(origin=(39.766521547, 27.85, 19.25), z_dir=(0, 0, 1)), keep=Keep.TOP, mode=Mode.PRIVATE)
    fillet_2_piece_18 = split(fillet_2_piece_18, bisect_by=Plane(origin=(39.766521547, 29.2, 19.792941909), z_dir=(0, -1, 0)), keep=Keep.TOP, mode=Mode.PRIVATE)
    add(fillet_2_piece_18, mode=Mode.SUBTRACT)
    with BuildSketch(Plane(origin=(40, -0.5, 20), x_dir=(0, 0, -1), z_dir=(0, 1, 0))) as fillet_2_piece_19_section:
        with BuildLine():
            CenterArc((FILLET_2_R, FILLET_2_R), FILLET_2_R, 180, 90)
            Line((0, FILLET_2_R), (0, 0))
            Line((0, 0), (FILLET_2_R, 0))
        make_face()
    fillet_2_piece_19 = extrude(amount=38, mode=Mode.PRIVATE)
    fillet_2_piece_19 = split(fillet_2_piece_19, bisect_by=Plane(origin=(40.003280029, 33.35, 19.25), z_dir=(0, 0, -1)), keep=Keep.TOP, mode=Mode.PRIVATE)
    fillet_2_piece_19 = split(fillet_2_piece_19, bisect_by=Plane(origin=(40.003280029, 29.2, 19.146607635), z_dir=(0, 1, 0)), keep=Keep.TOP, mode=Mode.PRIVATE)
    add(fillet_2_piece_19, mode=Mode.SUBTRACT)
    with BuildSketch(Plane(origin=(40, -0.5, 20), x_dir=(0, 0, -1), z_dir=(0, 1, 0))) as fillet_2_piece_20_section:
        with BuildLine():
            CenterArc((FILLET_2_R, FILLET_2_R), FILLET_2_R, 180, 90)
            Line((0, FILLET_2_R), (0, 0))
            Line((0, 0), (FILLET_2_R, 0))
        make_face()
    fillet_2_piece_20 = extrude(amount=38, mode=Mode.PRIVATE)
    fillet_2_piece_20 = split(fillet_2_piece_20, bisect_by=Plane(origin=(39.766521547, 33.35, 19.25), z_dir=(0, 0, 1)), keep=Keep.TOP, mode=Mode.PRIVATE)
    fillet_2_piece_20 = split(fillet_2_piece_20, bisect_by=Plane(origin=(39.766521547, 29.2, 19.792941909), z_dir=(0, 1, 0)), keep=Keep.TOP, mode=Mode.PRIVATE)
    add(fillet_2_piece_20, mode=Mode.SUBTRACT)


solid = part.part
